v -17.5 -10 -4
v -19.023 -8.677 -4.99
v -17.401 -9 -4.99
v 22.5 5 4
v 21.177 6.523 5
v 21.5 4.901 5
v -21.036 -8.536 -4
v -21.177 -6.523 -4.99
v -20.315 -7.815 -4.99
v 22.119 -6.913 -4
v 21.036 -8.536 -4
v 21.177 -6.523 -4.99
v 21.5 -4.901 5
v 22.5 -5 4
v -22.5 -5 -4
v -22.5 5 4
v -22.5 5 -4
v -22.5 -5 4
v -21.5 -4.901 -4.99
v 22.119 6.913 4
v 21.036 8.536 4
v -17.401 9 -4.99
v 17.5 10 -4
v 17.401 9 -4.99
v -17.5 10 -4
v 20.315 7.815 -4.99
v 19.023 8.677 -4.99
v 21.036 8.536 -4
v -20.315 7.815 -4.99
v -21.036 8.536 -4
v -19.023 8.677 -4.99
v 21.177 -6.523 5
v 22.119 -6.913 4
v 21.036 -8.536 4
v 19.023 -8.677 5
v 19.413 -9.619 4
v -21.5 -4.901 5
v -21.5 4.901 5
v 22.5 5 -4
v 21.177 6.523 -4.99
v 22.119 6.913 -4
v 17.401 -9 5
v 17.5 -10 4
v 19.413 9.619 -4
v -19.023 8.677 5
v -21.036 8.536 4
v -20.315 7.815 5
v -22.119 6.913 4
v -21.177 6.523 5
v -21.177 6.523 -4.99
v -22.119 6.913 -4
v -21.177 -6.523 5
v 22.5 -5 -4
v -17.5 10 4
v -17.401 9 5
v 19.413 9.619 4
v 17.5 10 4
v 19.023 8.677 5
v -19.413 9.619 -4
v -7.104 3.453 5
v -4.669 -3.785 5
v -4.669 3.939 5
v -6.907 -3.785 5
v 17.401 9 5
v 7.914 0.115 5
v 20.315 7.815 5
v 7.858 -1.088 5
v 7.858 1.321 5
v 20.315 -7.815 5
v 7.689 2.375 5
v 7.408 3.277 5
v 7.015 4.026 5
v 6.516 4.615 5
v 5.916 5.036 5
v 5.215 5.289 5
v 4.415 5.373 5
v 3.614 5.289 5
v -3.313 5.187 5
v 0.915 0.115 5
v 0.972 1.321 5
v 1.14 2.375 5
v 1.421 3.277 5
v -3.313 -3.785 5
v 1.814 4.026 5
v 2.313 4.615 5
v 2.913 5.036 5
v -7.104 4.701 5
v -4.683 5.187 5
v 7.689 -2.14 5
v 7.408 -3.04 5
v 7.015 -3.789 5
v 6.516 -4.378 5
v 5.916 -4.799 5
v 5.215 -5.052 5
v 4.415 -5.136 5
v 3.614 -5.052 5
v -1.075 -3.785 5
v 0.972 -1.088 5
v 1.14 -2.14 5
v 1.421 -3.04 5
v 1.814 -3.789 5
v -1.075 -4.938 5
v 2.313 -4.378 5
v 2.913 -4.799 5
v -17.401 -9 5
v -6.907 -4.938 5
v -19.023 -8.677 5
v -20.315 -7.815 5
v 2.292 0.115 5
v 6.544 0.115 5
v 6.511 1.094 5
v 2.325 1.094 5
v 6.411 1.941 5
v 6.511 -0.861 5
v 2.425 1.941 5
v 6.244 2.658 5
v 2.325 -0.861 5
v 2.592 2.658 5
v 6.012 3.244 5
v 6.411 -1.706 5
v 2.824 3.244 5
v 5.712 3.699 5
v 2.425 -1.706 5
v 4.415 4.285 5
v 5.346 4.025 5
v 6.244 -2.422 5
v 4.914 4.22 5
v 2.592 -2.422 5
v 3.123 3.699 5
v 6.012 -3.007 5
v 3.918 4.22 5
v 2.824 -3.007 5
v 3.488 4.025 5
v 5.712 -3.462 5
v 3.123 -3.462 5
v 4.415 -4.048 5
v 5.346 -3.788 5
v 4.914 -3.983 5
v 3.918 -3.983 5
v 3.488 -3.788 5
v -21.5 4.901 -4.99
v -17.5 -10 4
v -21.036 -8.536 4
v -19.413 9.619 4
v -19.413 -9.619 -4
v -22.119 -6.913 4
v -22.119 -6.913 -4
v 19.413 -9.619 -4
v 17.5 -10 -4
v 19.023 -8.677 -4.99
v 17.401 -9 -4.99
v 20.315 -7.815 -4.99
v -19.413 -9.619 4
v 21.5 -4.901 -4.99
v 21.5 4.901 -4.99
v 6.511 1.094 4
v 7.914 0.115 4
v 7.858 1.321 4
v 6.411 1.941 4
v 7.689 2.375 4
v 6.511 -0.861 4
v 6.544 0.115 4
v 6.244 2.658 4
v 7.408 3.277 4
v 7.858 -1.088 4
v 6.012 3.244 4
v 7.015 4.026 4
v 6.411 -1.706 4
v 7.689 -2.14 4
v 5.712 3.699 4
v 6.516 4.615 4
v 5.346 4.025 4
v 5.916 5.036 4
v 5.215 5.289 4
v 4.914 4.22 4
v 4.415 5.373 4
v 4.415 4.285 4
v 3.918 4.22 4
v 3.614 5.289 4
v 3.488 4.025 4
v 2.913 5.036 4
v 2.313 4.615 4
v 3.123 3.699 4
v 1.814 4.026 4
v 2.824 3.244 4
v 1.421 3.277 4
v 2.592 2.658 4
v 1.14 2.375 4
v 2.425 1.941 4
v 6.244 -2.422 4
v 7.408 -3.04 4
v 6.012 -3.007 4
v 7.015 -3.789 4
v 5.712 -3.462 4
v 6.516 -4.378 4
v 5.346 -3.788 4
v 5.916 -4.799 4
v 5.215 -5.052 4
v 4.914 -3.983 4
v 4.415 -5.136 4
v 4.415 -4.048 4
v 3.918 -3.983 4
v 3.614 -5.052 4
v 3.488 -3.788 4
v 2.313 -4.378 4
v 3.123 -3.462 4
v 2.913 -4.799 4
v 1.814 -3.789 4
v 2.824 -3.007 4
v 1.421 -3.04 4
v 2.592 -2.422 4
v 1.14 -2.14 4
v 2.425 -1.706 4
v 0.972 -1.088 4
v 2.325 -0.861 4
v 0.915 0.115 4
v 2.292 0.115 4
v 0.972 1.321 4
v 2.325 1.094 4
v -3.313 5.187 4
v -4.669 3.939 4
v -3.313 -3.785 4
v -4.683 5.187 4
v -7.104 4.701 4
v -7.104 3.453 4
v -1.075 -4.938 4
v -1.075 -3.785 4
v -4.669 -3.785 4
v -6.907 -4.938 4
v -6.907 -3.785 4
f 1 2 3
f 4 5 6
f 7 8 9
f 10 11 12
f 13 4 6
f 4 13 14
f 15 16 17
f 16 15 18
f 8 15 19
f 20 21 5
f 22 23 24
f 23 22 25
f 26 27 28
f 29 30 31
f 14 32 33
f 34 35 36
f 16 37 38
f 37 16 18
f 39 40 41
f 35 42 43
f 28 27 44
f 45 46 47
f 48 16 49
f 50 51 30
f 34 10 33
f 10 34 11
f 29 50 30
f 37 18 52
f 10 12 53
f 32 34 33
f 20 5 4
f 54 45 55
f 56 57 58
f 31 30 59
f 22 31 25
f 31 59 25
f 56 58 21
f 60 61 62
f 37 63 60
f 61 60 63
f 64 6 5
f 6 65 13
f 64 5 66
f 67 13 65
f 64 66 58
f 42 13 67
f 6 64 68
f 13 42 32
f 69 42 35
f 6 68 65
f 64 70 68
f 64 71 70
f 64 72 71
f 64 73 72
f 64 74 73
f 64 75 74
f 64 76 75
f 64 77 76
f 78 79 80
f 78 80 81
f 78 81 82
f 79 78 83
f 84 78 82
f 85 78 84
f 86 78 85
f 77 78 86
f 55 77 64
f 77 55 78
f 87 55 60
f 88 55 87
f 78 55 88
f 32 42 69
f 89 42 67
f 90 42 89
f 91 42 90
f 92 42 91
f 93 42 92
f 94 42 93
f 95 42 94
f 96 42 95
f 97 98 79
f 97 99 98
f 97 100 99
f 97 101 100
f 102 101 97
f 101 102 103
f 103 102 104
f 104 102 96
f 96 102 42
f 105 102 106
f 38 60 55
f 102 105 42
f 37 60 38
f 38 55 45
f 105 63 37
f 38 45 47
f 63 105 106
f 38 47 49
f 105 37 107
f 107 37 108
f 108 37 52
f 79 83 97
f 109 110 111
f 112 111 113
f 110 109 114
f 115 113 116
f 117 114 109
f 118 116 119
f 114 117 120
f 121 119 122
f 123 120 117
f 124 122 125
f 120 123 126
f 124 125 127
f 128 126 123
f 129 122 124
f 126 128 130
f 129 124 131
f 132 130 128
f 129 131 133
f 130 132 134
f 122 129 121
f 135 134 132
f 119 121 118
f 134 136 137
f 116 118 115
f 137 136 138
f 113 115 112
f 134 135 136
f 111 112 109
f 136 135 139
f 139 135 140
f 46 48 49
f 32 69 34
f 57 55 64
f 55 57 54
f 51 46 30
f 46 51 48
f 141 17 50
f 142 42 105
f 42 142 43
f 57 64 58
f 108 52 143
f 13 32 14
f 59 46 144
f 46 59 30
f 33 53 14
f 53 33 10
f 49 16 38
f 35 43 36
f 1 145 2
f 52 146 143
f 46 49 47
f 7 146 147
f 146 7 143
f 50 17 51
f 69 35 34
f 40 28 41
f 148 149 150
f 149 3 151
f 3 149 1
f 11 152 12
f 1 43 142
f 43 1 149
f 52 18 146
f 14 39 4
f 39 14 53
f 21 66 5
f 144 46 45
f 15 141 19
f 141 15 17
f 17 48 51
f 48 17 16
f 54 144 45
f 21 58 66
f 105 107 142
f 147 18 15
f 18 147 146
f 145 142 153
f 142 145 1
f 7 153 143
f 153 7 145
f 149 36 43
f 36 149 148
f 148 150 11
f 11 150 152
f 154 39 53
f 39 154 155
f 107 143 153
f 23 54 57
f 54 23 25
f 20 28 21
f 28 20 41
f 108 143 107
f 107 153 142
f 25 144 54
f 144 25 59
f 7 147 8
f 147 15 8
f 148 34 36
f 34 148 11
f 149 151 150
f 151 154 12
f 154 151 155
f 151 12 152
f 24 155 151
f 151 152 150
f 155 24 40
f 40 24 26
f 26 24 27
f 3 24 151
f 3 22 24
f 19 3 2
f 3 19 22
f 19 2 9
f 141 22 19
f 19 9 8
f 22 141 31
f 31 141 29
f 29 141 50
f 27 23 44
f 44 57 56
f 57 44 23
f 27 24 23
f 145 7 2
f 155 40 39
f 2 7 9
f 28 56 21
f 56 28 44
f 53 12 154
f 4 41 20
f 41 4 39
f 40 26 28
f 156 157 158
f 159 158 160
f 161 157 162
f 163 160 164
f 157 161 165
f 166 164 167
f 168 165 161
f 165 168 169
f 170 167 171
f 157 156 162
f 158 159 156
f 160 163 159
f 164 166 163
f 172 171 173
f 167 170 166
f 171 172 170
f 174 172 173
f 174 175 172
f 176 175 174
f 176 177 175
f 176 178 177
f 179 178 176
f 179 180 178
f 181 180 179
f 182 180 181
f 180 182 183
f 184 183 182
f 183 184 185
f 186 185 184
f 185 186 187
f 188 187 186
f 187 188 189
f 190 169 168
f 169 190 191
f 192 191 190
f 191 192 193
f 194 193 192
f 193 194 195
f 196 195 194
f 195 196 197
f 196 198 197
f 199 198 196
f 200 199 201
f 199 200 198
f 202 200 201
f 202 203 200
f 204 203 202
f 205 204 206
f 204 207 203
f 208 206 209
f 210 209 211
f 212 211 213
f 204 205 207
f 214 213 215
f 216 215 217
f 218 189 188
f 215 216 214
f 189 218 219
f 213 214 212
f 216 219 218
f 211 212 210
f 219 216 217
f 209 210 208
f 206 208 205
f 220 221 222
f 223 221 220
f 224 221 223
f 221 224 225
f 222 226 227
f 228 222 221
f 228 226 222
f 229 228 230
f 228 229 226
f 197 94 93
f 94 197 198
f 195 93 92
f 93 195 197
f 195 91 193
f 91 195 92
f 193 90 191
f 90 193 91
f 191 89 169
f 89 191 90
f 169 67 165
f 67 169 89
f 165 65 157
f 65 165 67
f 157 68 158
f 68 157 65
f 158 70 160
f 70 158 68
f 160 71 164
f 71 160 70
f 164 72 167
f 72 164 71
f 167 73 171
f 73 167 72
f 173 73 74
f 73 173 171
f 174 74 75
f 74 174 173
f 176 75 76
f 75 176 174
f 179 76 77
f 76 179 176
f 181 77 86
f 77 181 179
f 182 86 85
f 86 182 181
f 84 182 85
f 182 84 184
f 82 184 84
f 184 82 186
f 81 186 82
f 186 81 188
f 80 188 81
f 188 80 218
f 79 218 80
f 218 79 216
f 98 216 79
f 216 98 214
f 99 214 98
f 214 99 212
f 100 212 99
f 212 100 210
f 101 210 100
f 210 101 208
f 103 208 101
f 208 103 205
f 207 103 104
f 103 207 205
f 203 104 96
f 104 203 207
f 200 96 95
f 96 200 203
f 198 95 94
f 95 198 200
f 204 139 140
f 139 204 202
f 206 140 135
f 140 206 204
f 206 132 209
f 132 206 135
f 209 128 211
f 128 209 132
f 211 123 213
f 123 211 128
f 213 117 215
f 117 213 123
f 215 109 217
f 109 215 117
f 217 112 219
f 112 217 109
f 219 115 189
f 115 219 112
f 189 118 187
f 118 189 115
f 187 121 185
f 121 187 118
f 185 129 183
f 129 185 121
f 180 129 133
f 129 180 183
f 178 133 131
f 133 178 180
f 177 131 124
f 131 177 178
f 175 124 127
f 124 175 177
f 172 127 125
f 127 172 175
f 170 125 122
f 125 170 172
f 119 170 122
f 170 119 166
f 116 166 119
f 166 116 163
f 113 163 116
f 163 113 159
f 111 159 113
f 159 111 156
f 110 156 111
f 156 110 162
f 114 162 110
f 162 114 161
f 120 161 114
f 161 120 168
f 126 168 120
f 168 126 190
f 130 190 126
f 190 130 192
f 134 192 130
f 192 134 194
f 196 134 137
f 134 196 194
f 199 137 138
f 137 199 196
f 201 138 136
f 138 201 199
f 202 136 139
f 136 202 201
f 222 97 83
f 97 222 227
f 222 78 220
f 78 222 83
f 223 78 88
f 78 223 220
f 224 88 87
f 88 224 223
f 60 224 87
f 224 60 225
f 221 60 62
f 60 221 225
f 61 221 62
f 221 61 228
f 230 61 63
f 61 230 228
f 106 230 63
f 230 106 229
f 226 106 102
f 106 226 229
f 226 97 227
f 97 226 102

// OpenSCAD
// How high your spacer should be
HEIGHT = 10; // [0.2:0.1:100]

// How wide your spacer should be
WIDTH = 15; // [10:50]

// How long your spcer should be
LENGTH = 40; // [40:120]

/* [Hidden] */
EPS = 0.01;

module spacer(height=HEIGHT, width=WIDTH, length=LENGTH) {
    
    fillet = min(width, length) / 3;
    chamfer = min(1, height / 3);
    engrave_depth = min(1, height/2);
    
    module spacer_sketch() {
        offset(r=fillet)
            square([length-fillet, width-fillet], center=true);
    }
    
    difference() {
        hull() { // the spacer
            translate([0,0, -height/2 + EPS]) linear_extrude(EPS)
                offset(delta=-chamfer) spacer_sketch(); // bottom chamfer
            linear_extrude(height-2*chamfer, center=true)
                spacer_sketch(); // main body
            translate([0,0, height/2 - EPS]) linear_extrude(EPS)
                offset(delta=-chamfer) spacer_sketch(); // top chamfer
        }

        // text to engrave in the spacer
        translate([0,0, height/2-engrave_depth])
            linear_extrude(engrave_depth + EPS)
                text(str(height), size=width * 2 / 3,
                     halign="center", valign="center",
                     font="sans"); 
    }
    
}

spacer();
